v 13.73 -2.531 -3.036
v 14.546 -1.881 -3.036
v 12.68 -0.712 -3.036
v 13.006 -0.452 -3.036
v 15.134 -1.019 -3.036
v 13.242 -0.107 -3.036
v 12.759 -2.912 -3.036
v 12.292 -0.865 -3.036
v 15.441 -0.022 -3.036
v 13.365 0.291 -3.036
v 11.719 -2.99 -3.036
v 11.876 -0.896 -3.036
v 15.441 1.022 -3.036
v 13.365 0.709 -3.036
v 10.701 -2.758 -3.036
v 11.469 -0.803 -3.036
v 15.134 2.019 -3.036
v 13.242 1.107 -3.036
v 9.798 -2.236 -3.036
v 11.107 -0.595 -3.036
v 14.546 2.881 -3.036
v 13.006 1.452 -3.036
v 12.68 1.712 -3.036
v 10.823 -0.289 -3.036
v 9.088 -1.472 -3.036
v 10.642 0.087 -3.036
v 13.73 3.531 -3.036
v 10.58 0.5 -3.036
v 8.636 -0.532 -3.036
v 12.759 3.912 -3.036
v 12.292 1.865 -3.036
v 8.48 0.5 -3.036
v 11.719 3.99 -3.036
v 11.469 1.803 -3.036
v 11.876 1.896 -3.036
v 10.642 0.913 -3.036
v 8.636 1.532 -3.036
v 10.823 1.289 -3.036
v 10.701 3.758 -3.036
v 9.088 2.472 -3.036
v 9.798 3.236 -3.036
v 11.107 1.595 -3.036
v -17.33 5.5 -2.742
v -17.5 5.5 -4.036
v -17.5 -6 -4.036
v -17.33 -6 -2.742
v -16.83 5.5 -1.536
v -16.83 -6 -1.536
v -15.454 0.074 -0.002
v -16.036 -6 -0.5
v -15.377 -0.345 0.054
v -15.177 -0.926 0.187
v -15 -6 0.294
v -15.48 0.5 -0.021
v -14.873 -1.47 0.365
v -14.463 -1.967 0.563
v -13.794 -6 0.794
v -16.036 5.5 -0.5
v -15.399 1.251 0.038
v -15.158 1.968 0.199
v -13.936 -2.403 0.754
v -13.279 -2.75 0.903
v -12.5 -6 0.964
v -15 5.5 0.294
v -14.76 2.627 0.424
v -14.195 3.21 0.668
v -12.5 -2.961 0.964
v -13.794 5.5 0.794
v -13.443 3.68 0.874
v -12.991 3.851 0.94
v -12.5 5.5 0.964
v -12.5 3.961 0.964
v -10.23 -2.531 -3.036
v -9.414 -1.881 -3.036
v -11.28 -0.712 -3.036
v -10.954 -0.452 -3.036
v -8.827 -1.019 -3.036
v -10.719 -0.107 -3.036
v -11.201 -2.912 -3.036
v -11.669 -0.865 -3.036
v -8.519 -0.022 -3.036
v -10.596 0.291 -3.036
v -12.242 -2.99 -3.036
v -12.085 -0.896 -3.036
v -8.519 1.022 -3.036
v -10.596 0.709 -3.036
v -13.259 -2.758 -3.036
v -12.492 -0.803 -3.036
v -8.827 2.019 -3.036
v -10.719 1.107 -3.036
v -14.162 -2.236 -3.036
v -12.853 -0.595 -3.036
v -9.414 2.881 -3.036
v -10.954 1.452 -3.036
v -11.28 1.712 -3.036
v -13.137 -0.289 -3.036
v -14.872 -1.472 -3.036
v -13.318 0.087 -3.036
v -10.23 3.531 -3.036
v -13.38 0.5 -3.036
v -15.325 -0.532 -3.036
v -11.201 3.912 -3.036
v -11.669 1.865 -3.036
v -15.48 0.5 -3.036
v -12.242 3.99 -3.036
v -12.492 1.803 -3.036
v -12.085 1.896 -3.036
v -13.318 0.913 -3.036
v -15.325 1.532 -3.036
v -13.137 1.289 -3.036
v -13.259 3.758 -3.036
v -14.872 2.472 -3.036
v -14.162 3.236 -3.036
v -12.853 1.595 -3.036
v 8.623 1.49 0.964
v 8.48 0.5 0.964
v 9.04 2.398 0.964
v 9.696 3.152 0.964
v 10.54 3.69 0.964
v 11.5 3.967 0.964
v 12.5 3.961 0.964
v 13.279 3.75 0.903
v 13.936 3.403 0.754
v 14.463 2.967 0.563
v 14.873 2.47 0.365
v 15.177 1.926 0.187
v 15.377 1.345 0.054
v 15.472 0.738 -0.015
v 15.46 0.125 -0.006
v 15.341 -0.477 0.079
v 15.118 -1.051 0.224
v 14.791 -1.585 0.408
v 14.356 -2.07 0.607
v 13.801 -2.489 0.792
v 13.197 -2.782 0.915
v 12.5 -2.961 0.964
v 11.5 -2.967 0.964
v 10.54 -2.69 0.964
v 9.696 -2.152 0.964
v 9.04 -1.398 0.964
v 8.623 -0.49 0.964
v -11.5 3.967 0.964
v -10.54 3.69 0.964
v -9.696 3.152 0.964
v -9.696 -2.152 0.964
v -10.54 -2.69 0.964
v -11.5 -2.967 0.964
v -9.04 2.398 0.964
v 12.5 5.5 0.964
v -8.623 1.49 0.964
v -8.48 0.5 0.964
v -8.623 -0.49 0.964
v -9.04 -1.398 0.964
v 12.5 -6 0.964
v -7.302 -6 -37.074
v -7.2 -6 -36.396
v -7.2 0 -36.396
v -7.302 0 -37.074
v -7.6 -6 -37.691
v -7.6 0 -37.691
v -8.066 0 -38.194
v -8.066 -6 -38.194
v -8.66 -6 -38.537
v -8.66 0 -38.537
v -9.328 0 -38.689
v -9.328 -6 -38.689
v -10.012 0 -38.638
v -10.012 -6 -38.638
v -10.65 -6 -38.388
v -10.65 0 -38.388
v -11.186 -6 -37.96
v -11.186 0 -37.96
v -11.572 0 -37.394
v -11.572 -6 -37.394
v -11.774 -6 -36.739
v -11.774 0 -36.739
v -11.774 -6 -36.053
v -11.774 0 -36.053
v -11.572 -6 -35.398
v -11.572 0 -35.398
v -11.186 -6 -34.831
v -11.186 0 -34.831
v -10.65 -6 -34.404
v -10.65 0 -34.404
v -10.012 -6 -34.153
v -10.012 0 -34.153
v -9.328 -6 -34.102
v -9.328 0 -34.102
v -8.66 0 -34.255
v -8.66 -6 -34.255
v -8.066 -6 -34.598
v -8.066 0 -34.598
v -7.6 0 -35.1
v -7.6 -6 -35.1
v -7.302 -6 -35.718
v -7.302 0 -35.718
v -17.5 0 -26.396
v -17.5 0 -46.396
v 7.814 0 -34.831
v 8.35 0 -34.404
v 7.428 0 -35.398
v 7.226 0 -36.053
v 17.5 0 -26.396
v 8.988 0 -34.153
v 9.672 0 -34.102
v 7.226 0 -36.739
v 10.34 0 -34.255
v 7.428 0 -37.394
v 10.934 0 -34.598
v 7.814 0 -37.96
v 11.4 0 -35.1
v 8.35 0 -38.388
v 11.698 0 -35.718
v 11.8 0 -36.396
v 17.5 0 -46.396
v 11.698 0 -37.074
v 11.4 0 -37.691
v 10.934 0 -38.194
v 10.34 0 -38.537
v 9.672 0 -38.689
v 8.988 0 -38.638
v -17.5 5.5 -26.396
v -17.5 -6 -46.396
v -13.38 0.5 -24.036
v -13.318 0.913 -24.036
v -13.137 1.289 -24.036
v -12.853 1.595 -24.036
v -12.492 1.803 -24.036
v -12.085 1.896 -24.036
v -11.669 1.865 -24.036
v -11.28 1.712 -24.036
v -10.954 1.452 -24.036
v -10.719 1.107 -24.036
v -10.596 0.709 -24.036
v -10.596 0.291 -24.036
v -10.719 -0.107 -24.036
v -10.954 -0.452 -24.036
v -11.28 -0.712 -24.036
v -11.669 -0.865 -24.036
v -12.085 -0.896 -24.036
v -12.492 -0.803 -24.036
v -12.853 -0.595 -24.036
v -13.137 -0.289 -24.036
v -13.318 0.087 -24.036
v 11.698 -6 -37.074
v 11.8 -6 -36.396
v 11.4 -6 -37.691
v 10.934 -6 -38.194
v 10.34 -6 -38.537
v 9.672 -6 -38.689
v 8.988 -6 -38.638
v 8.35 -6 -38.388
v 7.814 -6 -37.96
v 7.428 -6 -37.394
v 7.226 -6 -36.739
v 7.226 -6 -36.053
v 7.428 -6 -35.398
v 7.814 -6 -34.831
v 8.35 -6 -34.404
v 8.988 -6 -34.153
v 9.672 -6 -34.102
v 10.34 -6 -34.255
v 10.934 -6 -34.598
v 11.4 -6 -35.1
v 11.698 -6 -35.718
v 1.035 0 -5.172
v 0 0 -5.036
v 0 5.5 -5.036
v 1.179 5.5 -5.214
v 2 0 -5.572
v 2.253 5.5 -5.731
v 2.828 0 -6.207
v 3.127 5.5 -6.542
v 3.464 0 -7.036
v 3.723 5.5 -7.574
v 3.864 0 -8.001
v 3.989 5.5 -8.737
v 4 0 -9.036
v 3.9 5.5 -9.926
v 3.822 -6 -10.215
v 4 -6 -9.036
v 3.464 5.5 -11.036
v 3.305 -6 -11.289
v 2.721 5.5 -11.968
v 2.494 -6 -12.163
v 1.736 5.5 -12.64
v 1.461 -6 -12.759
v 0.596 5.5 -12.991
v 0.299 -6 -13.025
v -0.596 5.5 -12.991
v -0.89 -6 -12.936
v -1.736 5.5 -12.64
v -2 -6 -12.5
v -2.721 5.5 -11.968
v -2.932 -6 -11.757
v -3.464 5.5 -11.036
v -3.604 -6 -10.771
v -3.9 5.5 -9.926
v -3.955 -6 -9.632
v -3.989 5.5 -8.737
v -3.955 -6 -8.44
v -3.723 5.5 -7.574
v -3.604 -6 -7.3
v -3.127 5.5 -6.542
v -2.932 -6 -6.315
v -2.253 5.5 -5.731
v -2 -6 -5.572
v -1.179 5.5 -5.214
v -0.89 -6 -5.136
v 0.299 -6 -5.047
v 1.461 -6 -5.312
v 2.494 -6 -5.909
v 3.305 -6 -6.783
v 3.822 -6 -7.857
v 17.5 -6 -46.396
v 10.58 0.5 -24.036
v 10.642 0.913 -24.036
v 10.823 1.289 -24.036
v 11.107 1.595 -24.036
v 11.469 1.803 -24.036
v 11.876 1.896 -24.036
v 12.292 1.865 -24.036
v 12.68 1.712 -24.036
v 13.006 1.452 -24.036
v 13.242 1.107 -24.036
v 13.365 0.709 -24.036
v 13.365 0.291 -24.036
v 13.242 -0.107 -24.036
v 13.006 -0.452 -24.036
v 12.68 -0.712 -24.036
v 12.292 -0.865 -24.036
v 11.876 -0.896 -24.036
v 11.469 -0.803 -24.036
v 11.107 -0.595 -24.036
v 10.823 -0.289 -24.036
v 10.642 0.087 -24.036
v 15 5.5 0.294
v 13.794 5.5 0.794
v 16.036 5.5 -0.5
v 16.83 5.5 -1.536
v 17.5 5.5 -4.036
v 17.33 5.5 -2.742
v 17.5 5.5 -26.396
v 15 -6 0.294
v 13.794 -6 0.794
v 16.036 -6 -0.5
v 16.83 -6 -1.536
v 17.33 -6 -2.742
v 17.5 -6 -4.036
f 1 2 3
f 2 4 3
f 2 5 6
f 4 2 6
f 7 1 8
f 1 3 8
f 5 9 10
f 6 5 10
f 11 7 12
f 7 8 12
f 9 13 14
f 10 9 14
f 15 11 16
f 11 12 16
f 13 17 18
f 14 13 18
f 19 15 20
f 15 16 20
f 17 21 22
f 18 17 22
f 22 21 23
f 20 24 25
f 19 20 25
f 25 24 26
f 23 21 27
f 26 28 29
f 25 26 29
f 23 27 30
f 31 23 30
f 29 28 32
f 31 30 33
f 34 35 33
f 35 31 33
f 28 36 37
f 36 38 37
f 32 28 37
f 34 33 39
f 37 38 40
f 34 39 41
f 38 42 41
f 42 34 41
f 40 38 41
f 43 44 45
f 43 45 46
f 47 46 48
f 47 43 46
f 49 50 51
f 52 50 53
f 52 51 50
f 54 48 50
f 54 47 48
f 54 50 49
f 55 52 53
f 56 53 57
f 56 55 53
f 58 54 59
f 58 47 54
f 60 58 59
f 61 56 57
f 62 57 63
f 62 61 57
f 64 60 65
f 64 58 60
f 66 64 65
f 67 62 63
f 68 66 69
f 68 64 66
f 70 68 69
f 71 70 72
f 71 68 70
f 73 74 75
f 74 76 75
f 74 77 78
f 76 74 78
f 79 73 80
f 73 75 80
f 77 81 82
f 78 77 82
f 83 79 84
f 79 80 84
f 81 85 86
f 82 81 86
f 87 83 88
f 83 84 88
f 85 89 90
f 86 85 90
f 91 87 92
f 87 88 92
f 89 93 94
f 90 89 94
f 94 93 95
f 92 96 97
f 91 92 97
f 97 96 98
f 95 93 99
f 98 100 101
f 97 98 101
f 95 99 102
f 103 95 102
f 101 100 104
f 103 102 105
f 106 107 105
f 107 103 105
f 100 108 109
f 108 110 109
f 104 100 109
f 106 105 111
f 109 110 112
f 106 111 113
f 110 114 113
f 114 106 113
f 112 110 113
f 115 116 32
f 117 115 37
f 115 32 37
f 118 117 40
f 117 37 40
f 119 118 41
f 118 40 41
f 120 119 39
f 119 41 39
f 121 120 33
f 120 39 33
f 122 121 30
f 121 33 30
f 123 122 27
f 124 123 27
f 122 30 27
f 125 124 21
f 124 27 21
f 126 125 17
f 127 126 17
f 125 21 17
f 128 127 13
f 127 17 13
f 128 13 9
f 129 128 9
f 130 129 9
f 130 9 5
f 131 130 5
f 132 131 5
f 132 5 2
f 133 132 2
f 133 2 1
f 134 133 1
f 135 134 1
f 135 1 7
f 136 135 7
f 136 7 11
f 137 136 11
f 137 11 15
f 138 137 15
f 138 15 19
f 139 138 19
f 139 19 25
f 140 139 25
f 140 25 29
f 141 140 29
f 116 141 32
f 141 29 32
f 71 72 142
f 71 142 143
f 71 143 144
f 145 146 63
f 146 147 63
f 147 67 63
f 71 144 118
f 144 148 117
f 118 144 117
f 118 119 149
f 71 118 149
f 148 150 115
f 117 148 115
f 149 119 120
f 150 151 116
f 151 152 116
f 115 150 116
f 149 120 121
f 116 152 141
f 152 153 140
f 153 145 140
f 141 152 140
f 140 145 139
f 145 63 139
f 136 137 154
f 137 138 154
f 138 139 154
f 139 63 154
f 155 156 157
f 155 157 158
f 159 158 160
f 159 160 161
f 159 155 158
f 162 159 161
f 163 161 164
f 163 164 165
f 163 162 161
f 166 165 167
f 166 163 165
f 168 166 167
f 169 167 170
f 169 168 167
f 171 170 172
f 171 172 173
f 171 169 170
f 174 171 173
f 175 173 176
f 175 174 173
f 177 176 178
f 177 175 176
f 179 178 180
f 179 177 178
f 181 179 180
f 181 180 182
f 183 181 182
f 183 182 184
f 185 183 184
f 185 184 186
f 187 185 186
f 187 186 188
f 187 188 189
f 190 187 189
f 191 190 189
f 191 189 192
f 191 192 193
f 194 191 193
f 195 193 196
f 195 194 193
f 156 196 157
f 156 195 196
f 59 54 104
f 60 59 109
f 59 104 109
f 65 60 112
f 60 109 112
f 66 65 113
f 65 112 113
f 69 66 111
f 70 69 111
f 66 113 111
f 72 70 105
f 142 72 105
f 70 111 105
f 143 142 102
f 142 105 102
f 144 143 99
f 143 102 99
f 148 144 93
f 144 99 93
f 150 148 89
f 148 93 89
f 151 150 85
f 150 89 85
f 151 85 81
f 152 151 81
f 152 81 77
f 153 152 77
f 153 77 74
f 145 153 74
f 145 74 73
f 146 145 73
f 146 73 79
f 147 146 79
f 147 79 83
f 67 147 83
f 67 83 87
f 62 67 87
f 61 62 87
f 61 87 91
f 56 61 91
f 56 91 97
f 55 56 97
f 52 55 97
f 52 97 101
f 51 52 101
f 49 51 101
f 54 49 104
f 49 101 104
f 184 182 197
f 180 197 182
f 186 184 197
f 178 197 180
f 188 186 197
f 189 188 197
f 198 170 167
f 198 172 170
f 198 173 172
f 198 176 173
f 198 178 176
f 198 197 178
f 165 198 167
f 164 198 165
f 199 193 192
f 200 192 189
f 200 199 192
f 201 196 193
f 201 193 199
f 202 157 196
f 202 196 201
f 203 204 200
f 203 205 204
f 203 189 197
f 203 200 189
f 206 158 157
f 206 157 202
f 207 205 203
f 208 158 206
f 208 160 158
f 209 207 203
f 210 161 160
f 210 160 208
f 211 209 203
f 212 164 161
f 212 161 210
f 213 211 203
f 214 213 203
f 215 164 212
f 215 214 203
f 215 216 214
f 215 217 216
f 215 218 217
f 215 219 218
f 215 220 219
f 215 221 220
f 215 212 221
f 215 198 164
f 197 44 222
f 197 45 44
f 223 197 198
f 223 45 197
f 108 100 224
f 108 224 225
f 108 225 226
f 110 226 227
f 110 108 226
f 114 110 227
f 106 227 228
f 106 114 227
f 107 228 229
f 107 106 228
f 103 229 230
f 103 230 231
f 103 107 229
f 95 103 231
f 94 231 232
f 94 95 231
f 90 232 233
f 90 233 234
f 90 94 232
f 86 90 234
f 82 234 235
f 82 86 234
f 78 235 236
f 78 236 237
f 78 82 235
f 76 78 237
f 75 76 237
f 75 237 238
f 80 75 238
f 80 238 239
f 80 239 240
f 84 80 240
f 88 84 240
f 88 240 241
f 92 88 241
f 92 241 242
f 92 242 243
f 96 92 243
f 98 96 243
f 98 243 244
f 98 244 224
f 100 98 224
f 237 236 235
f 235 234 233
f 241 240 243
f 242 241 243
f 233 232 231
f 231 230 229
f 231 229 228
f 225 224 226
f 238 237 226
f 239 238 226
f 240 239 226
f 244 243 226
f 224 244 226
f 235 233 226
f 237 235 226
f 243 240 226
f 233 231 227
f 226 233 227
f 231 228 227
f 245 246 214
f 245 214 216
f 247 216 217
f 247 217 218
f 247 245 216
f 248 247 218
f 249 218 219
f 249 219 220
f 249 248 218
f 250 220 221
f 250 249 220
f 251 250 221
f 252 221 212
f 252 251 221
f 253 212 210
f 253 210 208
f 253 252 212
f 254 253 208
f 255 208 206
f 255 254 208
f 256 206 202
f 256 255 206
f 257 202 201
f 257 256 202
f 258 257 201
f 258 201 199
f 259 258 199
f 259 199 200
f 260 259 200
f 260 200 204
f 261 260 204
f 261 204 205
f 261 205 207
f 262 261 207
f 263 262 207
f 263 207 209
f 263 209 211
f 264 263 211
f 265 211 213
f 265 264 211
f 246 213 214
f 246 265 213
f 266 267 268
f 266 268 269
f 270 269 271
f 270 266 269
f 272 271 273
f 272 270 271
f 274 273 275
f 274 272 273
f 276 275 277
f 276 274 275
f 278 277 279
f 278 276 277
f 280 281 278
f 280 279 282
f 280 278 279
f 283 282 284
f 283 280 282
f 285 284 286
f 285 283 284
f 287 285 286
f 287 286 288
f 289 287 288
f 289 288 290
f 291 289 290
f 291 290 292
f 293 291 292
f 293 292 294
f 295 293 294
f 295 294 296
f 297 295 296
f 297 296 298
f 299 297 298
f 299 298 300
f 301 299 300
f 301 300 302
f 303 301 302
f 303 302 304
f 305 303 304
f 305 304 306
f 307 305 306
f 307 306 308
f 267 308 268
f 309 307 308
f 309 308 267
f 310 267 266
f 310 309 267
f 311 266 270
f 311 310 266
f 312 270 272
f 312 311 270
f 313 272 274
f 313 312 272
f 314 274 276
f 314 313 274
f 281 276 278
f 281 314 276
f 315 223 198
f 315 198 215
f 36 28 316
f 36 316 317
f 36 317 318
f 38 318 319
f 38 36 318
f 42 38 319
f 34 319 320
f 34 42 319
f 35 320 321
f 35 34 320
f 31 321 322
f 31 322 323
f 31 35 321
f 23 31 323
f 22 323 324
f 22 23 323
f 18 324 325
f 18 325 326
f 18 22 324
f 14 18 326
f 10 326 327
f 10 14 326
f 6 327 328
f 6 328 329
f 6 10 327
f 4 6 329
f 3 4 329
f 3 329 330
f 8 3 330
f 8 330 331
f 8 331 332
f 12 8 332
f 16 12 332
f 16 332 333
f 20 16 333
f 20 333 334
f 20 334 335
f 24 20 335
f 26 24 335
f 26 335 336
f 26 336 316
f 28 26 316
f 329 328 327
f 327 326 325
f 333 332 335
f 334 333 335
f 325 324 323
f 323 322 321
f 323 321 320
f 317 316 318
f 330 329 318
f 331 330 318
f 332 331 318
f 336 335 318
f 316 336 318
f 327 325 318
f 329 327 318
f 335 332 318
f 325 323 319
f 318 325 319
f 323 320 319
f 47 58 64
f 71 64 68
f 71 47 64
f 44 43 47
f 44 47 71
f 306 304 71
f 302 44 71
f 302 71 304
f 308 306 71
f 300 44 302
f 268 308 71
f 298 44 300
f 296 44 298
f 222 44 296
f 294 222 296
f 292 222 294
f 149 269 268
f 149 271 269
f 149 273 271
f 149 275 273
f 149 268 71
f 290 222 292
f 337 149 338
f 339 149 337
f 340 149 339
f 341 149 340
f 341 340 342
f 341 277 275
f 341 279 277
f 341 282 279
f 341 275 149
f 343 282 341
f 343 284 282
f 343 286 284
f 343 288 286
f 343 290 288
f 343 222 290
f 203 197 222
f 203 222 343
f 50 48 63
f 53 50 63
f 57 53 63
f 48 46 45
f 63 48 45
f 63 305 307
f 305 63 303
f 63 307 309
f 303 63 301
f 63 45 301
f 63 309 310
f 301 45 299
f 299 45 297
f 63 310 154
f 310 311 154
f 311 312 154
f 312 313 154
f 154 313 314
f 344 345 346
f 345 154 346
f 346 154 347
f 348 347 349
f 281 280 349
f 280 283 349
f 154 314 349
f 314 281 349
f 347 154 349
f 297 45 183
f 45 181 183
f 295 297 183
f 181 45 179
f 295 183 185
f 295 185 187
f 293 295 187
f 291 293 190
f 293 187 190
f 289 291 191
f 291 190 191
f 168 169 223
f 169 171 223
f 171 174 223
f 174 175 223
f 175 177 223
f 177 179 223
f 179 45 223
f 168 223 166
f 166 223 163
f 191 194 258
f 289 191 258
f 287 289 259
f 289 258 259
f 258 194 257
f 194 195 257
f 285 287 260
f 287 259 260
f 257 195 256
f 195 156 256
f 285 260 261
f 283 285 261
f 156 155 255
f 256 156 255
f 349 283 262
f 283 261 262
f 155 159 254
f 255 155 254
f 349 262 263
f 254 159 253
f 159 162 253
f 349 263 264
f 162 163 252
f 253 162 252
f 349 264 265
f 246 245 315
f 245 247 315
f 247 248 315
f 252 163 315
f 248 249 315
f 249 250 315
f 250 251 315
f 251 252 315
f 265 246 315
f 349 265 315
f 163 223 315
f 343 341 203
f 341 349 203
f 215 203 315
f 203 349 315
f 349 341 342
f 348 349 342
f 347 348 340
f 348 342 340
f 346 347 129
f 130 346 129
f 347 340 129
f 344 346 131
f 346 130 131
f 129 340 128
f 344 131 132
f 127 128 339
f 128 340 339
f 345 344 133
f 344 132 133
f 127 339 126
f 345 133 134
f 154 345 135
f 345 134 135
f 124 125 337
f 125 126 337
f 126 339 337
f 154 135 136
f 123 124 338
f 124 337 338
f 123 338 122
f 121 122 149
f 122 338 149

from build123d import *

# Parameters (mm, degrees)
SKETCH1_W                 = 35
SKETCH1_H                 = 27.36
SKETCH1_R                 = 4
BOSS_EXTRUDE1_DEPTH       = 5.5
BOSS_EXTRUDE2_START       = -11.5
BOSS_EXTRUDE2_OUTLINE_W   = 35
BOSS_EXTRUDE2_OUTLINE_H   = 47.36
BOSS_EXTRUDE2_OUTLINE_R   = 4
BOSS_EXTRUDE2_OUTLINE_R_2 = 2.3
BOSS_EXTRUDE2_DEPTH       = 6
FILLET1_R                 = 5
CUT_EXTRUDE1_DEPTH        = 15
CUT_EXTRUDE1_DEPTH_BACK   = 42.689562243
SKETCH4_R                 = 1.4
CUT_EXTRUDE2_START        = -6
SKETCH4_3_R               = 3.5
SKETCH4_3_R_2             = 1.4
CUT_EXTRUDE2_DEPTH        = 15


# Read off the part's stored shape, not the designer's step: Boss-Extrude2
with BuildPart() as part:
    # Sketch1 → Boss-Extrude1 (new body)
    with BuildSketch(Plane(origin=(0, 0, 0), x_dir=(1, 0, 0), z_dir=(0, 1, 0))):
        with Locations((0, 12.715830395)):
            Rectangle(SKETCH1_W, SKETCH1_H)
        with Locations(Location((0, 9.035830395, 0), (0, 0, 270))):
            Circle(SKETCH1_R, mode=Mode.SUBTRACT)
    extrude(amount=BOSS_EXTRUDE1_DEPTH)

    # Boss-Extrude2 outline → Boss-Extrude2 (add)
    with BuildSketch(Plane(origin=(0, 5.5, 0), x_dir=(1, 0, 0), z_dir=(0, 1, 0)).offset(BOSS_EXTRUDE2_START)):
        with Locations((0, 22.715830395)):
            Rectangle(BOSS_EXTRUDE2_OUTLINE_W, BOSS_EXTRUDE2_OUTLINE_H)
        with Locations((0, 9.035830395)):
            Circle(BOSS_EXTRUDE2_OUTLINE_R, mode=Mode.SUBTRACT)
        with Locations((-9.5, 36.395830395)):
            Circle(BOSS_EXTRUDE2_OUTLINE_R_2, mode=Mode.SUBTRACT)
        with Locations((9.5, 36.395830395)):
            Circle(BOSS_EXTRUDE2_OUTLINE_R_2, mode=Mode.SUBTRACT)
    extrude(amount=BOSS_EXTRUDE2_DEPTH)

    # Fillet1
    fillet1_edges = [part.edges().sort_by_distance(p)[0] for p in [
        (17.5, -3, 0.964169605),
        (-17.5, -3, 0.964169605),
    ]]
    fillet(fillet1_edges, radius=FILLET1_R)

    # Sketch4 → Cut-Extrude1 (cut, two sides: drawn at the far end of the back side and taken through both)
    with BuildSketch(Plane(origin=(0, 0, -9.035830395), x_dir=(-1, 0, 0), z_dir=(0, 0, -1)).offset(-CUT_EXTRUDE1_DEPTH_BACK)):
        with Locations((-11.980167066, 0.5)):
            Circle(SKETCH4_R)
        with Locations((11.980167066, 0.5)):
            Circle(SKETCH4_R)
    extrude(amount=CUT_EXTRUDE1_DEPTH + CUT_EXTRUDE1_DEPTH_BACK, mode=Mode.SUBTRACT)

    # Sketch4<3> → Cut-Extrude2 (cut)
    # profile 1 of 2: a face of its own
    with BuildSketch(Plane(origin=(0, 0, -9.035830395), x_dir=(-1, 0, 0), z_dir=(0, 0, -1)).offset(CUT_EXTRUDE2_START)):
        with Locations((-11.980167066, 0.5)):
            Circle(SKETCH4_3_R)
        with Locations((-11.980167066, 0.5)):
            Circle(SKETCH4_3_R_2, mode=Mode.SUBTRACT)
    # profile 2 of 2: a face of its own
    with BuildSketch(Plane(origin=(0, 0, -9.035830395), x_dir=(-1, 0, 0), z_dir=(0, 0, -1)).offset(CUT_EXTRUDE2_START)):
        with Locations((11.980167066, 0.5)):
            Circle(SKETCH4_3_R)
        with Locations((11.980167066, 0.5)):
            Circle(SKETCH4_3_R_2, mode=Mode.SUBTRACT)
    extrude(amount=-CUT_EXTRUDE2_DEPTH, mode=Mode.SUBTRACT)


solid = part.part
